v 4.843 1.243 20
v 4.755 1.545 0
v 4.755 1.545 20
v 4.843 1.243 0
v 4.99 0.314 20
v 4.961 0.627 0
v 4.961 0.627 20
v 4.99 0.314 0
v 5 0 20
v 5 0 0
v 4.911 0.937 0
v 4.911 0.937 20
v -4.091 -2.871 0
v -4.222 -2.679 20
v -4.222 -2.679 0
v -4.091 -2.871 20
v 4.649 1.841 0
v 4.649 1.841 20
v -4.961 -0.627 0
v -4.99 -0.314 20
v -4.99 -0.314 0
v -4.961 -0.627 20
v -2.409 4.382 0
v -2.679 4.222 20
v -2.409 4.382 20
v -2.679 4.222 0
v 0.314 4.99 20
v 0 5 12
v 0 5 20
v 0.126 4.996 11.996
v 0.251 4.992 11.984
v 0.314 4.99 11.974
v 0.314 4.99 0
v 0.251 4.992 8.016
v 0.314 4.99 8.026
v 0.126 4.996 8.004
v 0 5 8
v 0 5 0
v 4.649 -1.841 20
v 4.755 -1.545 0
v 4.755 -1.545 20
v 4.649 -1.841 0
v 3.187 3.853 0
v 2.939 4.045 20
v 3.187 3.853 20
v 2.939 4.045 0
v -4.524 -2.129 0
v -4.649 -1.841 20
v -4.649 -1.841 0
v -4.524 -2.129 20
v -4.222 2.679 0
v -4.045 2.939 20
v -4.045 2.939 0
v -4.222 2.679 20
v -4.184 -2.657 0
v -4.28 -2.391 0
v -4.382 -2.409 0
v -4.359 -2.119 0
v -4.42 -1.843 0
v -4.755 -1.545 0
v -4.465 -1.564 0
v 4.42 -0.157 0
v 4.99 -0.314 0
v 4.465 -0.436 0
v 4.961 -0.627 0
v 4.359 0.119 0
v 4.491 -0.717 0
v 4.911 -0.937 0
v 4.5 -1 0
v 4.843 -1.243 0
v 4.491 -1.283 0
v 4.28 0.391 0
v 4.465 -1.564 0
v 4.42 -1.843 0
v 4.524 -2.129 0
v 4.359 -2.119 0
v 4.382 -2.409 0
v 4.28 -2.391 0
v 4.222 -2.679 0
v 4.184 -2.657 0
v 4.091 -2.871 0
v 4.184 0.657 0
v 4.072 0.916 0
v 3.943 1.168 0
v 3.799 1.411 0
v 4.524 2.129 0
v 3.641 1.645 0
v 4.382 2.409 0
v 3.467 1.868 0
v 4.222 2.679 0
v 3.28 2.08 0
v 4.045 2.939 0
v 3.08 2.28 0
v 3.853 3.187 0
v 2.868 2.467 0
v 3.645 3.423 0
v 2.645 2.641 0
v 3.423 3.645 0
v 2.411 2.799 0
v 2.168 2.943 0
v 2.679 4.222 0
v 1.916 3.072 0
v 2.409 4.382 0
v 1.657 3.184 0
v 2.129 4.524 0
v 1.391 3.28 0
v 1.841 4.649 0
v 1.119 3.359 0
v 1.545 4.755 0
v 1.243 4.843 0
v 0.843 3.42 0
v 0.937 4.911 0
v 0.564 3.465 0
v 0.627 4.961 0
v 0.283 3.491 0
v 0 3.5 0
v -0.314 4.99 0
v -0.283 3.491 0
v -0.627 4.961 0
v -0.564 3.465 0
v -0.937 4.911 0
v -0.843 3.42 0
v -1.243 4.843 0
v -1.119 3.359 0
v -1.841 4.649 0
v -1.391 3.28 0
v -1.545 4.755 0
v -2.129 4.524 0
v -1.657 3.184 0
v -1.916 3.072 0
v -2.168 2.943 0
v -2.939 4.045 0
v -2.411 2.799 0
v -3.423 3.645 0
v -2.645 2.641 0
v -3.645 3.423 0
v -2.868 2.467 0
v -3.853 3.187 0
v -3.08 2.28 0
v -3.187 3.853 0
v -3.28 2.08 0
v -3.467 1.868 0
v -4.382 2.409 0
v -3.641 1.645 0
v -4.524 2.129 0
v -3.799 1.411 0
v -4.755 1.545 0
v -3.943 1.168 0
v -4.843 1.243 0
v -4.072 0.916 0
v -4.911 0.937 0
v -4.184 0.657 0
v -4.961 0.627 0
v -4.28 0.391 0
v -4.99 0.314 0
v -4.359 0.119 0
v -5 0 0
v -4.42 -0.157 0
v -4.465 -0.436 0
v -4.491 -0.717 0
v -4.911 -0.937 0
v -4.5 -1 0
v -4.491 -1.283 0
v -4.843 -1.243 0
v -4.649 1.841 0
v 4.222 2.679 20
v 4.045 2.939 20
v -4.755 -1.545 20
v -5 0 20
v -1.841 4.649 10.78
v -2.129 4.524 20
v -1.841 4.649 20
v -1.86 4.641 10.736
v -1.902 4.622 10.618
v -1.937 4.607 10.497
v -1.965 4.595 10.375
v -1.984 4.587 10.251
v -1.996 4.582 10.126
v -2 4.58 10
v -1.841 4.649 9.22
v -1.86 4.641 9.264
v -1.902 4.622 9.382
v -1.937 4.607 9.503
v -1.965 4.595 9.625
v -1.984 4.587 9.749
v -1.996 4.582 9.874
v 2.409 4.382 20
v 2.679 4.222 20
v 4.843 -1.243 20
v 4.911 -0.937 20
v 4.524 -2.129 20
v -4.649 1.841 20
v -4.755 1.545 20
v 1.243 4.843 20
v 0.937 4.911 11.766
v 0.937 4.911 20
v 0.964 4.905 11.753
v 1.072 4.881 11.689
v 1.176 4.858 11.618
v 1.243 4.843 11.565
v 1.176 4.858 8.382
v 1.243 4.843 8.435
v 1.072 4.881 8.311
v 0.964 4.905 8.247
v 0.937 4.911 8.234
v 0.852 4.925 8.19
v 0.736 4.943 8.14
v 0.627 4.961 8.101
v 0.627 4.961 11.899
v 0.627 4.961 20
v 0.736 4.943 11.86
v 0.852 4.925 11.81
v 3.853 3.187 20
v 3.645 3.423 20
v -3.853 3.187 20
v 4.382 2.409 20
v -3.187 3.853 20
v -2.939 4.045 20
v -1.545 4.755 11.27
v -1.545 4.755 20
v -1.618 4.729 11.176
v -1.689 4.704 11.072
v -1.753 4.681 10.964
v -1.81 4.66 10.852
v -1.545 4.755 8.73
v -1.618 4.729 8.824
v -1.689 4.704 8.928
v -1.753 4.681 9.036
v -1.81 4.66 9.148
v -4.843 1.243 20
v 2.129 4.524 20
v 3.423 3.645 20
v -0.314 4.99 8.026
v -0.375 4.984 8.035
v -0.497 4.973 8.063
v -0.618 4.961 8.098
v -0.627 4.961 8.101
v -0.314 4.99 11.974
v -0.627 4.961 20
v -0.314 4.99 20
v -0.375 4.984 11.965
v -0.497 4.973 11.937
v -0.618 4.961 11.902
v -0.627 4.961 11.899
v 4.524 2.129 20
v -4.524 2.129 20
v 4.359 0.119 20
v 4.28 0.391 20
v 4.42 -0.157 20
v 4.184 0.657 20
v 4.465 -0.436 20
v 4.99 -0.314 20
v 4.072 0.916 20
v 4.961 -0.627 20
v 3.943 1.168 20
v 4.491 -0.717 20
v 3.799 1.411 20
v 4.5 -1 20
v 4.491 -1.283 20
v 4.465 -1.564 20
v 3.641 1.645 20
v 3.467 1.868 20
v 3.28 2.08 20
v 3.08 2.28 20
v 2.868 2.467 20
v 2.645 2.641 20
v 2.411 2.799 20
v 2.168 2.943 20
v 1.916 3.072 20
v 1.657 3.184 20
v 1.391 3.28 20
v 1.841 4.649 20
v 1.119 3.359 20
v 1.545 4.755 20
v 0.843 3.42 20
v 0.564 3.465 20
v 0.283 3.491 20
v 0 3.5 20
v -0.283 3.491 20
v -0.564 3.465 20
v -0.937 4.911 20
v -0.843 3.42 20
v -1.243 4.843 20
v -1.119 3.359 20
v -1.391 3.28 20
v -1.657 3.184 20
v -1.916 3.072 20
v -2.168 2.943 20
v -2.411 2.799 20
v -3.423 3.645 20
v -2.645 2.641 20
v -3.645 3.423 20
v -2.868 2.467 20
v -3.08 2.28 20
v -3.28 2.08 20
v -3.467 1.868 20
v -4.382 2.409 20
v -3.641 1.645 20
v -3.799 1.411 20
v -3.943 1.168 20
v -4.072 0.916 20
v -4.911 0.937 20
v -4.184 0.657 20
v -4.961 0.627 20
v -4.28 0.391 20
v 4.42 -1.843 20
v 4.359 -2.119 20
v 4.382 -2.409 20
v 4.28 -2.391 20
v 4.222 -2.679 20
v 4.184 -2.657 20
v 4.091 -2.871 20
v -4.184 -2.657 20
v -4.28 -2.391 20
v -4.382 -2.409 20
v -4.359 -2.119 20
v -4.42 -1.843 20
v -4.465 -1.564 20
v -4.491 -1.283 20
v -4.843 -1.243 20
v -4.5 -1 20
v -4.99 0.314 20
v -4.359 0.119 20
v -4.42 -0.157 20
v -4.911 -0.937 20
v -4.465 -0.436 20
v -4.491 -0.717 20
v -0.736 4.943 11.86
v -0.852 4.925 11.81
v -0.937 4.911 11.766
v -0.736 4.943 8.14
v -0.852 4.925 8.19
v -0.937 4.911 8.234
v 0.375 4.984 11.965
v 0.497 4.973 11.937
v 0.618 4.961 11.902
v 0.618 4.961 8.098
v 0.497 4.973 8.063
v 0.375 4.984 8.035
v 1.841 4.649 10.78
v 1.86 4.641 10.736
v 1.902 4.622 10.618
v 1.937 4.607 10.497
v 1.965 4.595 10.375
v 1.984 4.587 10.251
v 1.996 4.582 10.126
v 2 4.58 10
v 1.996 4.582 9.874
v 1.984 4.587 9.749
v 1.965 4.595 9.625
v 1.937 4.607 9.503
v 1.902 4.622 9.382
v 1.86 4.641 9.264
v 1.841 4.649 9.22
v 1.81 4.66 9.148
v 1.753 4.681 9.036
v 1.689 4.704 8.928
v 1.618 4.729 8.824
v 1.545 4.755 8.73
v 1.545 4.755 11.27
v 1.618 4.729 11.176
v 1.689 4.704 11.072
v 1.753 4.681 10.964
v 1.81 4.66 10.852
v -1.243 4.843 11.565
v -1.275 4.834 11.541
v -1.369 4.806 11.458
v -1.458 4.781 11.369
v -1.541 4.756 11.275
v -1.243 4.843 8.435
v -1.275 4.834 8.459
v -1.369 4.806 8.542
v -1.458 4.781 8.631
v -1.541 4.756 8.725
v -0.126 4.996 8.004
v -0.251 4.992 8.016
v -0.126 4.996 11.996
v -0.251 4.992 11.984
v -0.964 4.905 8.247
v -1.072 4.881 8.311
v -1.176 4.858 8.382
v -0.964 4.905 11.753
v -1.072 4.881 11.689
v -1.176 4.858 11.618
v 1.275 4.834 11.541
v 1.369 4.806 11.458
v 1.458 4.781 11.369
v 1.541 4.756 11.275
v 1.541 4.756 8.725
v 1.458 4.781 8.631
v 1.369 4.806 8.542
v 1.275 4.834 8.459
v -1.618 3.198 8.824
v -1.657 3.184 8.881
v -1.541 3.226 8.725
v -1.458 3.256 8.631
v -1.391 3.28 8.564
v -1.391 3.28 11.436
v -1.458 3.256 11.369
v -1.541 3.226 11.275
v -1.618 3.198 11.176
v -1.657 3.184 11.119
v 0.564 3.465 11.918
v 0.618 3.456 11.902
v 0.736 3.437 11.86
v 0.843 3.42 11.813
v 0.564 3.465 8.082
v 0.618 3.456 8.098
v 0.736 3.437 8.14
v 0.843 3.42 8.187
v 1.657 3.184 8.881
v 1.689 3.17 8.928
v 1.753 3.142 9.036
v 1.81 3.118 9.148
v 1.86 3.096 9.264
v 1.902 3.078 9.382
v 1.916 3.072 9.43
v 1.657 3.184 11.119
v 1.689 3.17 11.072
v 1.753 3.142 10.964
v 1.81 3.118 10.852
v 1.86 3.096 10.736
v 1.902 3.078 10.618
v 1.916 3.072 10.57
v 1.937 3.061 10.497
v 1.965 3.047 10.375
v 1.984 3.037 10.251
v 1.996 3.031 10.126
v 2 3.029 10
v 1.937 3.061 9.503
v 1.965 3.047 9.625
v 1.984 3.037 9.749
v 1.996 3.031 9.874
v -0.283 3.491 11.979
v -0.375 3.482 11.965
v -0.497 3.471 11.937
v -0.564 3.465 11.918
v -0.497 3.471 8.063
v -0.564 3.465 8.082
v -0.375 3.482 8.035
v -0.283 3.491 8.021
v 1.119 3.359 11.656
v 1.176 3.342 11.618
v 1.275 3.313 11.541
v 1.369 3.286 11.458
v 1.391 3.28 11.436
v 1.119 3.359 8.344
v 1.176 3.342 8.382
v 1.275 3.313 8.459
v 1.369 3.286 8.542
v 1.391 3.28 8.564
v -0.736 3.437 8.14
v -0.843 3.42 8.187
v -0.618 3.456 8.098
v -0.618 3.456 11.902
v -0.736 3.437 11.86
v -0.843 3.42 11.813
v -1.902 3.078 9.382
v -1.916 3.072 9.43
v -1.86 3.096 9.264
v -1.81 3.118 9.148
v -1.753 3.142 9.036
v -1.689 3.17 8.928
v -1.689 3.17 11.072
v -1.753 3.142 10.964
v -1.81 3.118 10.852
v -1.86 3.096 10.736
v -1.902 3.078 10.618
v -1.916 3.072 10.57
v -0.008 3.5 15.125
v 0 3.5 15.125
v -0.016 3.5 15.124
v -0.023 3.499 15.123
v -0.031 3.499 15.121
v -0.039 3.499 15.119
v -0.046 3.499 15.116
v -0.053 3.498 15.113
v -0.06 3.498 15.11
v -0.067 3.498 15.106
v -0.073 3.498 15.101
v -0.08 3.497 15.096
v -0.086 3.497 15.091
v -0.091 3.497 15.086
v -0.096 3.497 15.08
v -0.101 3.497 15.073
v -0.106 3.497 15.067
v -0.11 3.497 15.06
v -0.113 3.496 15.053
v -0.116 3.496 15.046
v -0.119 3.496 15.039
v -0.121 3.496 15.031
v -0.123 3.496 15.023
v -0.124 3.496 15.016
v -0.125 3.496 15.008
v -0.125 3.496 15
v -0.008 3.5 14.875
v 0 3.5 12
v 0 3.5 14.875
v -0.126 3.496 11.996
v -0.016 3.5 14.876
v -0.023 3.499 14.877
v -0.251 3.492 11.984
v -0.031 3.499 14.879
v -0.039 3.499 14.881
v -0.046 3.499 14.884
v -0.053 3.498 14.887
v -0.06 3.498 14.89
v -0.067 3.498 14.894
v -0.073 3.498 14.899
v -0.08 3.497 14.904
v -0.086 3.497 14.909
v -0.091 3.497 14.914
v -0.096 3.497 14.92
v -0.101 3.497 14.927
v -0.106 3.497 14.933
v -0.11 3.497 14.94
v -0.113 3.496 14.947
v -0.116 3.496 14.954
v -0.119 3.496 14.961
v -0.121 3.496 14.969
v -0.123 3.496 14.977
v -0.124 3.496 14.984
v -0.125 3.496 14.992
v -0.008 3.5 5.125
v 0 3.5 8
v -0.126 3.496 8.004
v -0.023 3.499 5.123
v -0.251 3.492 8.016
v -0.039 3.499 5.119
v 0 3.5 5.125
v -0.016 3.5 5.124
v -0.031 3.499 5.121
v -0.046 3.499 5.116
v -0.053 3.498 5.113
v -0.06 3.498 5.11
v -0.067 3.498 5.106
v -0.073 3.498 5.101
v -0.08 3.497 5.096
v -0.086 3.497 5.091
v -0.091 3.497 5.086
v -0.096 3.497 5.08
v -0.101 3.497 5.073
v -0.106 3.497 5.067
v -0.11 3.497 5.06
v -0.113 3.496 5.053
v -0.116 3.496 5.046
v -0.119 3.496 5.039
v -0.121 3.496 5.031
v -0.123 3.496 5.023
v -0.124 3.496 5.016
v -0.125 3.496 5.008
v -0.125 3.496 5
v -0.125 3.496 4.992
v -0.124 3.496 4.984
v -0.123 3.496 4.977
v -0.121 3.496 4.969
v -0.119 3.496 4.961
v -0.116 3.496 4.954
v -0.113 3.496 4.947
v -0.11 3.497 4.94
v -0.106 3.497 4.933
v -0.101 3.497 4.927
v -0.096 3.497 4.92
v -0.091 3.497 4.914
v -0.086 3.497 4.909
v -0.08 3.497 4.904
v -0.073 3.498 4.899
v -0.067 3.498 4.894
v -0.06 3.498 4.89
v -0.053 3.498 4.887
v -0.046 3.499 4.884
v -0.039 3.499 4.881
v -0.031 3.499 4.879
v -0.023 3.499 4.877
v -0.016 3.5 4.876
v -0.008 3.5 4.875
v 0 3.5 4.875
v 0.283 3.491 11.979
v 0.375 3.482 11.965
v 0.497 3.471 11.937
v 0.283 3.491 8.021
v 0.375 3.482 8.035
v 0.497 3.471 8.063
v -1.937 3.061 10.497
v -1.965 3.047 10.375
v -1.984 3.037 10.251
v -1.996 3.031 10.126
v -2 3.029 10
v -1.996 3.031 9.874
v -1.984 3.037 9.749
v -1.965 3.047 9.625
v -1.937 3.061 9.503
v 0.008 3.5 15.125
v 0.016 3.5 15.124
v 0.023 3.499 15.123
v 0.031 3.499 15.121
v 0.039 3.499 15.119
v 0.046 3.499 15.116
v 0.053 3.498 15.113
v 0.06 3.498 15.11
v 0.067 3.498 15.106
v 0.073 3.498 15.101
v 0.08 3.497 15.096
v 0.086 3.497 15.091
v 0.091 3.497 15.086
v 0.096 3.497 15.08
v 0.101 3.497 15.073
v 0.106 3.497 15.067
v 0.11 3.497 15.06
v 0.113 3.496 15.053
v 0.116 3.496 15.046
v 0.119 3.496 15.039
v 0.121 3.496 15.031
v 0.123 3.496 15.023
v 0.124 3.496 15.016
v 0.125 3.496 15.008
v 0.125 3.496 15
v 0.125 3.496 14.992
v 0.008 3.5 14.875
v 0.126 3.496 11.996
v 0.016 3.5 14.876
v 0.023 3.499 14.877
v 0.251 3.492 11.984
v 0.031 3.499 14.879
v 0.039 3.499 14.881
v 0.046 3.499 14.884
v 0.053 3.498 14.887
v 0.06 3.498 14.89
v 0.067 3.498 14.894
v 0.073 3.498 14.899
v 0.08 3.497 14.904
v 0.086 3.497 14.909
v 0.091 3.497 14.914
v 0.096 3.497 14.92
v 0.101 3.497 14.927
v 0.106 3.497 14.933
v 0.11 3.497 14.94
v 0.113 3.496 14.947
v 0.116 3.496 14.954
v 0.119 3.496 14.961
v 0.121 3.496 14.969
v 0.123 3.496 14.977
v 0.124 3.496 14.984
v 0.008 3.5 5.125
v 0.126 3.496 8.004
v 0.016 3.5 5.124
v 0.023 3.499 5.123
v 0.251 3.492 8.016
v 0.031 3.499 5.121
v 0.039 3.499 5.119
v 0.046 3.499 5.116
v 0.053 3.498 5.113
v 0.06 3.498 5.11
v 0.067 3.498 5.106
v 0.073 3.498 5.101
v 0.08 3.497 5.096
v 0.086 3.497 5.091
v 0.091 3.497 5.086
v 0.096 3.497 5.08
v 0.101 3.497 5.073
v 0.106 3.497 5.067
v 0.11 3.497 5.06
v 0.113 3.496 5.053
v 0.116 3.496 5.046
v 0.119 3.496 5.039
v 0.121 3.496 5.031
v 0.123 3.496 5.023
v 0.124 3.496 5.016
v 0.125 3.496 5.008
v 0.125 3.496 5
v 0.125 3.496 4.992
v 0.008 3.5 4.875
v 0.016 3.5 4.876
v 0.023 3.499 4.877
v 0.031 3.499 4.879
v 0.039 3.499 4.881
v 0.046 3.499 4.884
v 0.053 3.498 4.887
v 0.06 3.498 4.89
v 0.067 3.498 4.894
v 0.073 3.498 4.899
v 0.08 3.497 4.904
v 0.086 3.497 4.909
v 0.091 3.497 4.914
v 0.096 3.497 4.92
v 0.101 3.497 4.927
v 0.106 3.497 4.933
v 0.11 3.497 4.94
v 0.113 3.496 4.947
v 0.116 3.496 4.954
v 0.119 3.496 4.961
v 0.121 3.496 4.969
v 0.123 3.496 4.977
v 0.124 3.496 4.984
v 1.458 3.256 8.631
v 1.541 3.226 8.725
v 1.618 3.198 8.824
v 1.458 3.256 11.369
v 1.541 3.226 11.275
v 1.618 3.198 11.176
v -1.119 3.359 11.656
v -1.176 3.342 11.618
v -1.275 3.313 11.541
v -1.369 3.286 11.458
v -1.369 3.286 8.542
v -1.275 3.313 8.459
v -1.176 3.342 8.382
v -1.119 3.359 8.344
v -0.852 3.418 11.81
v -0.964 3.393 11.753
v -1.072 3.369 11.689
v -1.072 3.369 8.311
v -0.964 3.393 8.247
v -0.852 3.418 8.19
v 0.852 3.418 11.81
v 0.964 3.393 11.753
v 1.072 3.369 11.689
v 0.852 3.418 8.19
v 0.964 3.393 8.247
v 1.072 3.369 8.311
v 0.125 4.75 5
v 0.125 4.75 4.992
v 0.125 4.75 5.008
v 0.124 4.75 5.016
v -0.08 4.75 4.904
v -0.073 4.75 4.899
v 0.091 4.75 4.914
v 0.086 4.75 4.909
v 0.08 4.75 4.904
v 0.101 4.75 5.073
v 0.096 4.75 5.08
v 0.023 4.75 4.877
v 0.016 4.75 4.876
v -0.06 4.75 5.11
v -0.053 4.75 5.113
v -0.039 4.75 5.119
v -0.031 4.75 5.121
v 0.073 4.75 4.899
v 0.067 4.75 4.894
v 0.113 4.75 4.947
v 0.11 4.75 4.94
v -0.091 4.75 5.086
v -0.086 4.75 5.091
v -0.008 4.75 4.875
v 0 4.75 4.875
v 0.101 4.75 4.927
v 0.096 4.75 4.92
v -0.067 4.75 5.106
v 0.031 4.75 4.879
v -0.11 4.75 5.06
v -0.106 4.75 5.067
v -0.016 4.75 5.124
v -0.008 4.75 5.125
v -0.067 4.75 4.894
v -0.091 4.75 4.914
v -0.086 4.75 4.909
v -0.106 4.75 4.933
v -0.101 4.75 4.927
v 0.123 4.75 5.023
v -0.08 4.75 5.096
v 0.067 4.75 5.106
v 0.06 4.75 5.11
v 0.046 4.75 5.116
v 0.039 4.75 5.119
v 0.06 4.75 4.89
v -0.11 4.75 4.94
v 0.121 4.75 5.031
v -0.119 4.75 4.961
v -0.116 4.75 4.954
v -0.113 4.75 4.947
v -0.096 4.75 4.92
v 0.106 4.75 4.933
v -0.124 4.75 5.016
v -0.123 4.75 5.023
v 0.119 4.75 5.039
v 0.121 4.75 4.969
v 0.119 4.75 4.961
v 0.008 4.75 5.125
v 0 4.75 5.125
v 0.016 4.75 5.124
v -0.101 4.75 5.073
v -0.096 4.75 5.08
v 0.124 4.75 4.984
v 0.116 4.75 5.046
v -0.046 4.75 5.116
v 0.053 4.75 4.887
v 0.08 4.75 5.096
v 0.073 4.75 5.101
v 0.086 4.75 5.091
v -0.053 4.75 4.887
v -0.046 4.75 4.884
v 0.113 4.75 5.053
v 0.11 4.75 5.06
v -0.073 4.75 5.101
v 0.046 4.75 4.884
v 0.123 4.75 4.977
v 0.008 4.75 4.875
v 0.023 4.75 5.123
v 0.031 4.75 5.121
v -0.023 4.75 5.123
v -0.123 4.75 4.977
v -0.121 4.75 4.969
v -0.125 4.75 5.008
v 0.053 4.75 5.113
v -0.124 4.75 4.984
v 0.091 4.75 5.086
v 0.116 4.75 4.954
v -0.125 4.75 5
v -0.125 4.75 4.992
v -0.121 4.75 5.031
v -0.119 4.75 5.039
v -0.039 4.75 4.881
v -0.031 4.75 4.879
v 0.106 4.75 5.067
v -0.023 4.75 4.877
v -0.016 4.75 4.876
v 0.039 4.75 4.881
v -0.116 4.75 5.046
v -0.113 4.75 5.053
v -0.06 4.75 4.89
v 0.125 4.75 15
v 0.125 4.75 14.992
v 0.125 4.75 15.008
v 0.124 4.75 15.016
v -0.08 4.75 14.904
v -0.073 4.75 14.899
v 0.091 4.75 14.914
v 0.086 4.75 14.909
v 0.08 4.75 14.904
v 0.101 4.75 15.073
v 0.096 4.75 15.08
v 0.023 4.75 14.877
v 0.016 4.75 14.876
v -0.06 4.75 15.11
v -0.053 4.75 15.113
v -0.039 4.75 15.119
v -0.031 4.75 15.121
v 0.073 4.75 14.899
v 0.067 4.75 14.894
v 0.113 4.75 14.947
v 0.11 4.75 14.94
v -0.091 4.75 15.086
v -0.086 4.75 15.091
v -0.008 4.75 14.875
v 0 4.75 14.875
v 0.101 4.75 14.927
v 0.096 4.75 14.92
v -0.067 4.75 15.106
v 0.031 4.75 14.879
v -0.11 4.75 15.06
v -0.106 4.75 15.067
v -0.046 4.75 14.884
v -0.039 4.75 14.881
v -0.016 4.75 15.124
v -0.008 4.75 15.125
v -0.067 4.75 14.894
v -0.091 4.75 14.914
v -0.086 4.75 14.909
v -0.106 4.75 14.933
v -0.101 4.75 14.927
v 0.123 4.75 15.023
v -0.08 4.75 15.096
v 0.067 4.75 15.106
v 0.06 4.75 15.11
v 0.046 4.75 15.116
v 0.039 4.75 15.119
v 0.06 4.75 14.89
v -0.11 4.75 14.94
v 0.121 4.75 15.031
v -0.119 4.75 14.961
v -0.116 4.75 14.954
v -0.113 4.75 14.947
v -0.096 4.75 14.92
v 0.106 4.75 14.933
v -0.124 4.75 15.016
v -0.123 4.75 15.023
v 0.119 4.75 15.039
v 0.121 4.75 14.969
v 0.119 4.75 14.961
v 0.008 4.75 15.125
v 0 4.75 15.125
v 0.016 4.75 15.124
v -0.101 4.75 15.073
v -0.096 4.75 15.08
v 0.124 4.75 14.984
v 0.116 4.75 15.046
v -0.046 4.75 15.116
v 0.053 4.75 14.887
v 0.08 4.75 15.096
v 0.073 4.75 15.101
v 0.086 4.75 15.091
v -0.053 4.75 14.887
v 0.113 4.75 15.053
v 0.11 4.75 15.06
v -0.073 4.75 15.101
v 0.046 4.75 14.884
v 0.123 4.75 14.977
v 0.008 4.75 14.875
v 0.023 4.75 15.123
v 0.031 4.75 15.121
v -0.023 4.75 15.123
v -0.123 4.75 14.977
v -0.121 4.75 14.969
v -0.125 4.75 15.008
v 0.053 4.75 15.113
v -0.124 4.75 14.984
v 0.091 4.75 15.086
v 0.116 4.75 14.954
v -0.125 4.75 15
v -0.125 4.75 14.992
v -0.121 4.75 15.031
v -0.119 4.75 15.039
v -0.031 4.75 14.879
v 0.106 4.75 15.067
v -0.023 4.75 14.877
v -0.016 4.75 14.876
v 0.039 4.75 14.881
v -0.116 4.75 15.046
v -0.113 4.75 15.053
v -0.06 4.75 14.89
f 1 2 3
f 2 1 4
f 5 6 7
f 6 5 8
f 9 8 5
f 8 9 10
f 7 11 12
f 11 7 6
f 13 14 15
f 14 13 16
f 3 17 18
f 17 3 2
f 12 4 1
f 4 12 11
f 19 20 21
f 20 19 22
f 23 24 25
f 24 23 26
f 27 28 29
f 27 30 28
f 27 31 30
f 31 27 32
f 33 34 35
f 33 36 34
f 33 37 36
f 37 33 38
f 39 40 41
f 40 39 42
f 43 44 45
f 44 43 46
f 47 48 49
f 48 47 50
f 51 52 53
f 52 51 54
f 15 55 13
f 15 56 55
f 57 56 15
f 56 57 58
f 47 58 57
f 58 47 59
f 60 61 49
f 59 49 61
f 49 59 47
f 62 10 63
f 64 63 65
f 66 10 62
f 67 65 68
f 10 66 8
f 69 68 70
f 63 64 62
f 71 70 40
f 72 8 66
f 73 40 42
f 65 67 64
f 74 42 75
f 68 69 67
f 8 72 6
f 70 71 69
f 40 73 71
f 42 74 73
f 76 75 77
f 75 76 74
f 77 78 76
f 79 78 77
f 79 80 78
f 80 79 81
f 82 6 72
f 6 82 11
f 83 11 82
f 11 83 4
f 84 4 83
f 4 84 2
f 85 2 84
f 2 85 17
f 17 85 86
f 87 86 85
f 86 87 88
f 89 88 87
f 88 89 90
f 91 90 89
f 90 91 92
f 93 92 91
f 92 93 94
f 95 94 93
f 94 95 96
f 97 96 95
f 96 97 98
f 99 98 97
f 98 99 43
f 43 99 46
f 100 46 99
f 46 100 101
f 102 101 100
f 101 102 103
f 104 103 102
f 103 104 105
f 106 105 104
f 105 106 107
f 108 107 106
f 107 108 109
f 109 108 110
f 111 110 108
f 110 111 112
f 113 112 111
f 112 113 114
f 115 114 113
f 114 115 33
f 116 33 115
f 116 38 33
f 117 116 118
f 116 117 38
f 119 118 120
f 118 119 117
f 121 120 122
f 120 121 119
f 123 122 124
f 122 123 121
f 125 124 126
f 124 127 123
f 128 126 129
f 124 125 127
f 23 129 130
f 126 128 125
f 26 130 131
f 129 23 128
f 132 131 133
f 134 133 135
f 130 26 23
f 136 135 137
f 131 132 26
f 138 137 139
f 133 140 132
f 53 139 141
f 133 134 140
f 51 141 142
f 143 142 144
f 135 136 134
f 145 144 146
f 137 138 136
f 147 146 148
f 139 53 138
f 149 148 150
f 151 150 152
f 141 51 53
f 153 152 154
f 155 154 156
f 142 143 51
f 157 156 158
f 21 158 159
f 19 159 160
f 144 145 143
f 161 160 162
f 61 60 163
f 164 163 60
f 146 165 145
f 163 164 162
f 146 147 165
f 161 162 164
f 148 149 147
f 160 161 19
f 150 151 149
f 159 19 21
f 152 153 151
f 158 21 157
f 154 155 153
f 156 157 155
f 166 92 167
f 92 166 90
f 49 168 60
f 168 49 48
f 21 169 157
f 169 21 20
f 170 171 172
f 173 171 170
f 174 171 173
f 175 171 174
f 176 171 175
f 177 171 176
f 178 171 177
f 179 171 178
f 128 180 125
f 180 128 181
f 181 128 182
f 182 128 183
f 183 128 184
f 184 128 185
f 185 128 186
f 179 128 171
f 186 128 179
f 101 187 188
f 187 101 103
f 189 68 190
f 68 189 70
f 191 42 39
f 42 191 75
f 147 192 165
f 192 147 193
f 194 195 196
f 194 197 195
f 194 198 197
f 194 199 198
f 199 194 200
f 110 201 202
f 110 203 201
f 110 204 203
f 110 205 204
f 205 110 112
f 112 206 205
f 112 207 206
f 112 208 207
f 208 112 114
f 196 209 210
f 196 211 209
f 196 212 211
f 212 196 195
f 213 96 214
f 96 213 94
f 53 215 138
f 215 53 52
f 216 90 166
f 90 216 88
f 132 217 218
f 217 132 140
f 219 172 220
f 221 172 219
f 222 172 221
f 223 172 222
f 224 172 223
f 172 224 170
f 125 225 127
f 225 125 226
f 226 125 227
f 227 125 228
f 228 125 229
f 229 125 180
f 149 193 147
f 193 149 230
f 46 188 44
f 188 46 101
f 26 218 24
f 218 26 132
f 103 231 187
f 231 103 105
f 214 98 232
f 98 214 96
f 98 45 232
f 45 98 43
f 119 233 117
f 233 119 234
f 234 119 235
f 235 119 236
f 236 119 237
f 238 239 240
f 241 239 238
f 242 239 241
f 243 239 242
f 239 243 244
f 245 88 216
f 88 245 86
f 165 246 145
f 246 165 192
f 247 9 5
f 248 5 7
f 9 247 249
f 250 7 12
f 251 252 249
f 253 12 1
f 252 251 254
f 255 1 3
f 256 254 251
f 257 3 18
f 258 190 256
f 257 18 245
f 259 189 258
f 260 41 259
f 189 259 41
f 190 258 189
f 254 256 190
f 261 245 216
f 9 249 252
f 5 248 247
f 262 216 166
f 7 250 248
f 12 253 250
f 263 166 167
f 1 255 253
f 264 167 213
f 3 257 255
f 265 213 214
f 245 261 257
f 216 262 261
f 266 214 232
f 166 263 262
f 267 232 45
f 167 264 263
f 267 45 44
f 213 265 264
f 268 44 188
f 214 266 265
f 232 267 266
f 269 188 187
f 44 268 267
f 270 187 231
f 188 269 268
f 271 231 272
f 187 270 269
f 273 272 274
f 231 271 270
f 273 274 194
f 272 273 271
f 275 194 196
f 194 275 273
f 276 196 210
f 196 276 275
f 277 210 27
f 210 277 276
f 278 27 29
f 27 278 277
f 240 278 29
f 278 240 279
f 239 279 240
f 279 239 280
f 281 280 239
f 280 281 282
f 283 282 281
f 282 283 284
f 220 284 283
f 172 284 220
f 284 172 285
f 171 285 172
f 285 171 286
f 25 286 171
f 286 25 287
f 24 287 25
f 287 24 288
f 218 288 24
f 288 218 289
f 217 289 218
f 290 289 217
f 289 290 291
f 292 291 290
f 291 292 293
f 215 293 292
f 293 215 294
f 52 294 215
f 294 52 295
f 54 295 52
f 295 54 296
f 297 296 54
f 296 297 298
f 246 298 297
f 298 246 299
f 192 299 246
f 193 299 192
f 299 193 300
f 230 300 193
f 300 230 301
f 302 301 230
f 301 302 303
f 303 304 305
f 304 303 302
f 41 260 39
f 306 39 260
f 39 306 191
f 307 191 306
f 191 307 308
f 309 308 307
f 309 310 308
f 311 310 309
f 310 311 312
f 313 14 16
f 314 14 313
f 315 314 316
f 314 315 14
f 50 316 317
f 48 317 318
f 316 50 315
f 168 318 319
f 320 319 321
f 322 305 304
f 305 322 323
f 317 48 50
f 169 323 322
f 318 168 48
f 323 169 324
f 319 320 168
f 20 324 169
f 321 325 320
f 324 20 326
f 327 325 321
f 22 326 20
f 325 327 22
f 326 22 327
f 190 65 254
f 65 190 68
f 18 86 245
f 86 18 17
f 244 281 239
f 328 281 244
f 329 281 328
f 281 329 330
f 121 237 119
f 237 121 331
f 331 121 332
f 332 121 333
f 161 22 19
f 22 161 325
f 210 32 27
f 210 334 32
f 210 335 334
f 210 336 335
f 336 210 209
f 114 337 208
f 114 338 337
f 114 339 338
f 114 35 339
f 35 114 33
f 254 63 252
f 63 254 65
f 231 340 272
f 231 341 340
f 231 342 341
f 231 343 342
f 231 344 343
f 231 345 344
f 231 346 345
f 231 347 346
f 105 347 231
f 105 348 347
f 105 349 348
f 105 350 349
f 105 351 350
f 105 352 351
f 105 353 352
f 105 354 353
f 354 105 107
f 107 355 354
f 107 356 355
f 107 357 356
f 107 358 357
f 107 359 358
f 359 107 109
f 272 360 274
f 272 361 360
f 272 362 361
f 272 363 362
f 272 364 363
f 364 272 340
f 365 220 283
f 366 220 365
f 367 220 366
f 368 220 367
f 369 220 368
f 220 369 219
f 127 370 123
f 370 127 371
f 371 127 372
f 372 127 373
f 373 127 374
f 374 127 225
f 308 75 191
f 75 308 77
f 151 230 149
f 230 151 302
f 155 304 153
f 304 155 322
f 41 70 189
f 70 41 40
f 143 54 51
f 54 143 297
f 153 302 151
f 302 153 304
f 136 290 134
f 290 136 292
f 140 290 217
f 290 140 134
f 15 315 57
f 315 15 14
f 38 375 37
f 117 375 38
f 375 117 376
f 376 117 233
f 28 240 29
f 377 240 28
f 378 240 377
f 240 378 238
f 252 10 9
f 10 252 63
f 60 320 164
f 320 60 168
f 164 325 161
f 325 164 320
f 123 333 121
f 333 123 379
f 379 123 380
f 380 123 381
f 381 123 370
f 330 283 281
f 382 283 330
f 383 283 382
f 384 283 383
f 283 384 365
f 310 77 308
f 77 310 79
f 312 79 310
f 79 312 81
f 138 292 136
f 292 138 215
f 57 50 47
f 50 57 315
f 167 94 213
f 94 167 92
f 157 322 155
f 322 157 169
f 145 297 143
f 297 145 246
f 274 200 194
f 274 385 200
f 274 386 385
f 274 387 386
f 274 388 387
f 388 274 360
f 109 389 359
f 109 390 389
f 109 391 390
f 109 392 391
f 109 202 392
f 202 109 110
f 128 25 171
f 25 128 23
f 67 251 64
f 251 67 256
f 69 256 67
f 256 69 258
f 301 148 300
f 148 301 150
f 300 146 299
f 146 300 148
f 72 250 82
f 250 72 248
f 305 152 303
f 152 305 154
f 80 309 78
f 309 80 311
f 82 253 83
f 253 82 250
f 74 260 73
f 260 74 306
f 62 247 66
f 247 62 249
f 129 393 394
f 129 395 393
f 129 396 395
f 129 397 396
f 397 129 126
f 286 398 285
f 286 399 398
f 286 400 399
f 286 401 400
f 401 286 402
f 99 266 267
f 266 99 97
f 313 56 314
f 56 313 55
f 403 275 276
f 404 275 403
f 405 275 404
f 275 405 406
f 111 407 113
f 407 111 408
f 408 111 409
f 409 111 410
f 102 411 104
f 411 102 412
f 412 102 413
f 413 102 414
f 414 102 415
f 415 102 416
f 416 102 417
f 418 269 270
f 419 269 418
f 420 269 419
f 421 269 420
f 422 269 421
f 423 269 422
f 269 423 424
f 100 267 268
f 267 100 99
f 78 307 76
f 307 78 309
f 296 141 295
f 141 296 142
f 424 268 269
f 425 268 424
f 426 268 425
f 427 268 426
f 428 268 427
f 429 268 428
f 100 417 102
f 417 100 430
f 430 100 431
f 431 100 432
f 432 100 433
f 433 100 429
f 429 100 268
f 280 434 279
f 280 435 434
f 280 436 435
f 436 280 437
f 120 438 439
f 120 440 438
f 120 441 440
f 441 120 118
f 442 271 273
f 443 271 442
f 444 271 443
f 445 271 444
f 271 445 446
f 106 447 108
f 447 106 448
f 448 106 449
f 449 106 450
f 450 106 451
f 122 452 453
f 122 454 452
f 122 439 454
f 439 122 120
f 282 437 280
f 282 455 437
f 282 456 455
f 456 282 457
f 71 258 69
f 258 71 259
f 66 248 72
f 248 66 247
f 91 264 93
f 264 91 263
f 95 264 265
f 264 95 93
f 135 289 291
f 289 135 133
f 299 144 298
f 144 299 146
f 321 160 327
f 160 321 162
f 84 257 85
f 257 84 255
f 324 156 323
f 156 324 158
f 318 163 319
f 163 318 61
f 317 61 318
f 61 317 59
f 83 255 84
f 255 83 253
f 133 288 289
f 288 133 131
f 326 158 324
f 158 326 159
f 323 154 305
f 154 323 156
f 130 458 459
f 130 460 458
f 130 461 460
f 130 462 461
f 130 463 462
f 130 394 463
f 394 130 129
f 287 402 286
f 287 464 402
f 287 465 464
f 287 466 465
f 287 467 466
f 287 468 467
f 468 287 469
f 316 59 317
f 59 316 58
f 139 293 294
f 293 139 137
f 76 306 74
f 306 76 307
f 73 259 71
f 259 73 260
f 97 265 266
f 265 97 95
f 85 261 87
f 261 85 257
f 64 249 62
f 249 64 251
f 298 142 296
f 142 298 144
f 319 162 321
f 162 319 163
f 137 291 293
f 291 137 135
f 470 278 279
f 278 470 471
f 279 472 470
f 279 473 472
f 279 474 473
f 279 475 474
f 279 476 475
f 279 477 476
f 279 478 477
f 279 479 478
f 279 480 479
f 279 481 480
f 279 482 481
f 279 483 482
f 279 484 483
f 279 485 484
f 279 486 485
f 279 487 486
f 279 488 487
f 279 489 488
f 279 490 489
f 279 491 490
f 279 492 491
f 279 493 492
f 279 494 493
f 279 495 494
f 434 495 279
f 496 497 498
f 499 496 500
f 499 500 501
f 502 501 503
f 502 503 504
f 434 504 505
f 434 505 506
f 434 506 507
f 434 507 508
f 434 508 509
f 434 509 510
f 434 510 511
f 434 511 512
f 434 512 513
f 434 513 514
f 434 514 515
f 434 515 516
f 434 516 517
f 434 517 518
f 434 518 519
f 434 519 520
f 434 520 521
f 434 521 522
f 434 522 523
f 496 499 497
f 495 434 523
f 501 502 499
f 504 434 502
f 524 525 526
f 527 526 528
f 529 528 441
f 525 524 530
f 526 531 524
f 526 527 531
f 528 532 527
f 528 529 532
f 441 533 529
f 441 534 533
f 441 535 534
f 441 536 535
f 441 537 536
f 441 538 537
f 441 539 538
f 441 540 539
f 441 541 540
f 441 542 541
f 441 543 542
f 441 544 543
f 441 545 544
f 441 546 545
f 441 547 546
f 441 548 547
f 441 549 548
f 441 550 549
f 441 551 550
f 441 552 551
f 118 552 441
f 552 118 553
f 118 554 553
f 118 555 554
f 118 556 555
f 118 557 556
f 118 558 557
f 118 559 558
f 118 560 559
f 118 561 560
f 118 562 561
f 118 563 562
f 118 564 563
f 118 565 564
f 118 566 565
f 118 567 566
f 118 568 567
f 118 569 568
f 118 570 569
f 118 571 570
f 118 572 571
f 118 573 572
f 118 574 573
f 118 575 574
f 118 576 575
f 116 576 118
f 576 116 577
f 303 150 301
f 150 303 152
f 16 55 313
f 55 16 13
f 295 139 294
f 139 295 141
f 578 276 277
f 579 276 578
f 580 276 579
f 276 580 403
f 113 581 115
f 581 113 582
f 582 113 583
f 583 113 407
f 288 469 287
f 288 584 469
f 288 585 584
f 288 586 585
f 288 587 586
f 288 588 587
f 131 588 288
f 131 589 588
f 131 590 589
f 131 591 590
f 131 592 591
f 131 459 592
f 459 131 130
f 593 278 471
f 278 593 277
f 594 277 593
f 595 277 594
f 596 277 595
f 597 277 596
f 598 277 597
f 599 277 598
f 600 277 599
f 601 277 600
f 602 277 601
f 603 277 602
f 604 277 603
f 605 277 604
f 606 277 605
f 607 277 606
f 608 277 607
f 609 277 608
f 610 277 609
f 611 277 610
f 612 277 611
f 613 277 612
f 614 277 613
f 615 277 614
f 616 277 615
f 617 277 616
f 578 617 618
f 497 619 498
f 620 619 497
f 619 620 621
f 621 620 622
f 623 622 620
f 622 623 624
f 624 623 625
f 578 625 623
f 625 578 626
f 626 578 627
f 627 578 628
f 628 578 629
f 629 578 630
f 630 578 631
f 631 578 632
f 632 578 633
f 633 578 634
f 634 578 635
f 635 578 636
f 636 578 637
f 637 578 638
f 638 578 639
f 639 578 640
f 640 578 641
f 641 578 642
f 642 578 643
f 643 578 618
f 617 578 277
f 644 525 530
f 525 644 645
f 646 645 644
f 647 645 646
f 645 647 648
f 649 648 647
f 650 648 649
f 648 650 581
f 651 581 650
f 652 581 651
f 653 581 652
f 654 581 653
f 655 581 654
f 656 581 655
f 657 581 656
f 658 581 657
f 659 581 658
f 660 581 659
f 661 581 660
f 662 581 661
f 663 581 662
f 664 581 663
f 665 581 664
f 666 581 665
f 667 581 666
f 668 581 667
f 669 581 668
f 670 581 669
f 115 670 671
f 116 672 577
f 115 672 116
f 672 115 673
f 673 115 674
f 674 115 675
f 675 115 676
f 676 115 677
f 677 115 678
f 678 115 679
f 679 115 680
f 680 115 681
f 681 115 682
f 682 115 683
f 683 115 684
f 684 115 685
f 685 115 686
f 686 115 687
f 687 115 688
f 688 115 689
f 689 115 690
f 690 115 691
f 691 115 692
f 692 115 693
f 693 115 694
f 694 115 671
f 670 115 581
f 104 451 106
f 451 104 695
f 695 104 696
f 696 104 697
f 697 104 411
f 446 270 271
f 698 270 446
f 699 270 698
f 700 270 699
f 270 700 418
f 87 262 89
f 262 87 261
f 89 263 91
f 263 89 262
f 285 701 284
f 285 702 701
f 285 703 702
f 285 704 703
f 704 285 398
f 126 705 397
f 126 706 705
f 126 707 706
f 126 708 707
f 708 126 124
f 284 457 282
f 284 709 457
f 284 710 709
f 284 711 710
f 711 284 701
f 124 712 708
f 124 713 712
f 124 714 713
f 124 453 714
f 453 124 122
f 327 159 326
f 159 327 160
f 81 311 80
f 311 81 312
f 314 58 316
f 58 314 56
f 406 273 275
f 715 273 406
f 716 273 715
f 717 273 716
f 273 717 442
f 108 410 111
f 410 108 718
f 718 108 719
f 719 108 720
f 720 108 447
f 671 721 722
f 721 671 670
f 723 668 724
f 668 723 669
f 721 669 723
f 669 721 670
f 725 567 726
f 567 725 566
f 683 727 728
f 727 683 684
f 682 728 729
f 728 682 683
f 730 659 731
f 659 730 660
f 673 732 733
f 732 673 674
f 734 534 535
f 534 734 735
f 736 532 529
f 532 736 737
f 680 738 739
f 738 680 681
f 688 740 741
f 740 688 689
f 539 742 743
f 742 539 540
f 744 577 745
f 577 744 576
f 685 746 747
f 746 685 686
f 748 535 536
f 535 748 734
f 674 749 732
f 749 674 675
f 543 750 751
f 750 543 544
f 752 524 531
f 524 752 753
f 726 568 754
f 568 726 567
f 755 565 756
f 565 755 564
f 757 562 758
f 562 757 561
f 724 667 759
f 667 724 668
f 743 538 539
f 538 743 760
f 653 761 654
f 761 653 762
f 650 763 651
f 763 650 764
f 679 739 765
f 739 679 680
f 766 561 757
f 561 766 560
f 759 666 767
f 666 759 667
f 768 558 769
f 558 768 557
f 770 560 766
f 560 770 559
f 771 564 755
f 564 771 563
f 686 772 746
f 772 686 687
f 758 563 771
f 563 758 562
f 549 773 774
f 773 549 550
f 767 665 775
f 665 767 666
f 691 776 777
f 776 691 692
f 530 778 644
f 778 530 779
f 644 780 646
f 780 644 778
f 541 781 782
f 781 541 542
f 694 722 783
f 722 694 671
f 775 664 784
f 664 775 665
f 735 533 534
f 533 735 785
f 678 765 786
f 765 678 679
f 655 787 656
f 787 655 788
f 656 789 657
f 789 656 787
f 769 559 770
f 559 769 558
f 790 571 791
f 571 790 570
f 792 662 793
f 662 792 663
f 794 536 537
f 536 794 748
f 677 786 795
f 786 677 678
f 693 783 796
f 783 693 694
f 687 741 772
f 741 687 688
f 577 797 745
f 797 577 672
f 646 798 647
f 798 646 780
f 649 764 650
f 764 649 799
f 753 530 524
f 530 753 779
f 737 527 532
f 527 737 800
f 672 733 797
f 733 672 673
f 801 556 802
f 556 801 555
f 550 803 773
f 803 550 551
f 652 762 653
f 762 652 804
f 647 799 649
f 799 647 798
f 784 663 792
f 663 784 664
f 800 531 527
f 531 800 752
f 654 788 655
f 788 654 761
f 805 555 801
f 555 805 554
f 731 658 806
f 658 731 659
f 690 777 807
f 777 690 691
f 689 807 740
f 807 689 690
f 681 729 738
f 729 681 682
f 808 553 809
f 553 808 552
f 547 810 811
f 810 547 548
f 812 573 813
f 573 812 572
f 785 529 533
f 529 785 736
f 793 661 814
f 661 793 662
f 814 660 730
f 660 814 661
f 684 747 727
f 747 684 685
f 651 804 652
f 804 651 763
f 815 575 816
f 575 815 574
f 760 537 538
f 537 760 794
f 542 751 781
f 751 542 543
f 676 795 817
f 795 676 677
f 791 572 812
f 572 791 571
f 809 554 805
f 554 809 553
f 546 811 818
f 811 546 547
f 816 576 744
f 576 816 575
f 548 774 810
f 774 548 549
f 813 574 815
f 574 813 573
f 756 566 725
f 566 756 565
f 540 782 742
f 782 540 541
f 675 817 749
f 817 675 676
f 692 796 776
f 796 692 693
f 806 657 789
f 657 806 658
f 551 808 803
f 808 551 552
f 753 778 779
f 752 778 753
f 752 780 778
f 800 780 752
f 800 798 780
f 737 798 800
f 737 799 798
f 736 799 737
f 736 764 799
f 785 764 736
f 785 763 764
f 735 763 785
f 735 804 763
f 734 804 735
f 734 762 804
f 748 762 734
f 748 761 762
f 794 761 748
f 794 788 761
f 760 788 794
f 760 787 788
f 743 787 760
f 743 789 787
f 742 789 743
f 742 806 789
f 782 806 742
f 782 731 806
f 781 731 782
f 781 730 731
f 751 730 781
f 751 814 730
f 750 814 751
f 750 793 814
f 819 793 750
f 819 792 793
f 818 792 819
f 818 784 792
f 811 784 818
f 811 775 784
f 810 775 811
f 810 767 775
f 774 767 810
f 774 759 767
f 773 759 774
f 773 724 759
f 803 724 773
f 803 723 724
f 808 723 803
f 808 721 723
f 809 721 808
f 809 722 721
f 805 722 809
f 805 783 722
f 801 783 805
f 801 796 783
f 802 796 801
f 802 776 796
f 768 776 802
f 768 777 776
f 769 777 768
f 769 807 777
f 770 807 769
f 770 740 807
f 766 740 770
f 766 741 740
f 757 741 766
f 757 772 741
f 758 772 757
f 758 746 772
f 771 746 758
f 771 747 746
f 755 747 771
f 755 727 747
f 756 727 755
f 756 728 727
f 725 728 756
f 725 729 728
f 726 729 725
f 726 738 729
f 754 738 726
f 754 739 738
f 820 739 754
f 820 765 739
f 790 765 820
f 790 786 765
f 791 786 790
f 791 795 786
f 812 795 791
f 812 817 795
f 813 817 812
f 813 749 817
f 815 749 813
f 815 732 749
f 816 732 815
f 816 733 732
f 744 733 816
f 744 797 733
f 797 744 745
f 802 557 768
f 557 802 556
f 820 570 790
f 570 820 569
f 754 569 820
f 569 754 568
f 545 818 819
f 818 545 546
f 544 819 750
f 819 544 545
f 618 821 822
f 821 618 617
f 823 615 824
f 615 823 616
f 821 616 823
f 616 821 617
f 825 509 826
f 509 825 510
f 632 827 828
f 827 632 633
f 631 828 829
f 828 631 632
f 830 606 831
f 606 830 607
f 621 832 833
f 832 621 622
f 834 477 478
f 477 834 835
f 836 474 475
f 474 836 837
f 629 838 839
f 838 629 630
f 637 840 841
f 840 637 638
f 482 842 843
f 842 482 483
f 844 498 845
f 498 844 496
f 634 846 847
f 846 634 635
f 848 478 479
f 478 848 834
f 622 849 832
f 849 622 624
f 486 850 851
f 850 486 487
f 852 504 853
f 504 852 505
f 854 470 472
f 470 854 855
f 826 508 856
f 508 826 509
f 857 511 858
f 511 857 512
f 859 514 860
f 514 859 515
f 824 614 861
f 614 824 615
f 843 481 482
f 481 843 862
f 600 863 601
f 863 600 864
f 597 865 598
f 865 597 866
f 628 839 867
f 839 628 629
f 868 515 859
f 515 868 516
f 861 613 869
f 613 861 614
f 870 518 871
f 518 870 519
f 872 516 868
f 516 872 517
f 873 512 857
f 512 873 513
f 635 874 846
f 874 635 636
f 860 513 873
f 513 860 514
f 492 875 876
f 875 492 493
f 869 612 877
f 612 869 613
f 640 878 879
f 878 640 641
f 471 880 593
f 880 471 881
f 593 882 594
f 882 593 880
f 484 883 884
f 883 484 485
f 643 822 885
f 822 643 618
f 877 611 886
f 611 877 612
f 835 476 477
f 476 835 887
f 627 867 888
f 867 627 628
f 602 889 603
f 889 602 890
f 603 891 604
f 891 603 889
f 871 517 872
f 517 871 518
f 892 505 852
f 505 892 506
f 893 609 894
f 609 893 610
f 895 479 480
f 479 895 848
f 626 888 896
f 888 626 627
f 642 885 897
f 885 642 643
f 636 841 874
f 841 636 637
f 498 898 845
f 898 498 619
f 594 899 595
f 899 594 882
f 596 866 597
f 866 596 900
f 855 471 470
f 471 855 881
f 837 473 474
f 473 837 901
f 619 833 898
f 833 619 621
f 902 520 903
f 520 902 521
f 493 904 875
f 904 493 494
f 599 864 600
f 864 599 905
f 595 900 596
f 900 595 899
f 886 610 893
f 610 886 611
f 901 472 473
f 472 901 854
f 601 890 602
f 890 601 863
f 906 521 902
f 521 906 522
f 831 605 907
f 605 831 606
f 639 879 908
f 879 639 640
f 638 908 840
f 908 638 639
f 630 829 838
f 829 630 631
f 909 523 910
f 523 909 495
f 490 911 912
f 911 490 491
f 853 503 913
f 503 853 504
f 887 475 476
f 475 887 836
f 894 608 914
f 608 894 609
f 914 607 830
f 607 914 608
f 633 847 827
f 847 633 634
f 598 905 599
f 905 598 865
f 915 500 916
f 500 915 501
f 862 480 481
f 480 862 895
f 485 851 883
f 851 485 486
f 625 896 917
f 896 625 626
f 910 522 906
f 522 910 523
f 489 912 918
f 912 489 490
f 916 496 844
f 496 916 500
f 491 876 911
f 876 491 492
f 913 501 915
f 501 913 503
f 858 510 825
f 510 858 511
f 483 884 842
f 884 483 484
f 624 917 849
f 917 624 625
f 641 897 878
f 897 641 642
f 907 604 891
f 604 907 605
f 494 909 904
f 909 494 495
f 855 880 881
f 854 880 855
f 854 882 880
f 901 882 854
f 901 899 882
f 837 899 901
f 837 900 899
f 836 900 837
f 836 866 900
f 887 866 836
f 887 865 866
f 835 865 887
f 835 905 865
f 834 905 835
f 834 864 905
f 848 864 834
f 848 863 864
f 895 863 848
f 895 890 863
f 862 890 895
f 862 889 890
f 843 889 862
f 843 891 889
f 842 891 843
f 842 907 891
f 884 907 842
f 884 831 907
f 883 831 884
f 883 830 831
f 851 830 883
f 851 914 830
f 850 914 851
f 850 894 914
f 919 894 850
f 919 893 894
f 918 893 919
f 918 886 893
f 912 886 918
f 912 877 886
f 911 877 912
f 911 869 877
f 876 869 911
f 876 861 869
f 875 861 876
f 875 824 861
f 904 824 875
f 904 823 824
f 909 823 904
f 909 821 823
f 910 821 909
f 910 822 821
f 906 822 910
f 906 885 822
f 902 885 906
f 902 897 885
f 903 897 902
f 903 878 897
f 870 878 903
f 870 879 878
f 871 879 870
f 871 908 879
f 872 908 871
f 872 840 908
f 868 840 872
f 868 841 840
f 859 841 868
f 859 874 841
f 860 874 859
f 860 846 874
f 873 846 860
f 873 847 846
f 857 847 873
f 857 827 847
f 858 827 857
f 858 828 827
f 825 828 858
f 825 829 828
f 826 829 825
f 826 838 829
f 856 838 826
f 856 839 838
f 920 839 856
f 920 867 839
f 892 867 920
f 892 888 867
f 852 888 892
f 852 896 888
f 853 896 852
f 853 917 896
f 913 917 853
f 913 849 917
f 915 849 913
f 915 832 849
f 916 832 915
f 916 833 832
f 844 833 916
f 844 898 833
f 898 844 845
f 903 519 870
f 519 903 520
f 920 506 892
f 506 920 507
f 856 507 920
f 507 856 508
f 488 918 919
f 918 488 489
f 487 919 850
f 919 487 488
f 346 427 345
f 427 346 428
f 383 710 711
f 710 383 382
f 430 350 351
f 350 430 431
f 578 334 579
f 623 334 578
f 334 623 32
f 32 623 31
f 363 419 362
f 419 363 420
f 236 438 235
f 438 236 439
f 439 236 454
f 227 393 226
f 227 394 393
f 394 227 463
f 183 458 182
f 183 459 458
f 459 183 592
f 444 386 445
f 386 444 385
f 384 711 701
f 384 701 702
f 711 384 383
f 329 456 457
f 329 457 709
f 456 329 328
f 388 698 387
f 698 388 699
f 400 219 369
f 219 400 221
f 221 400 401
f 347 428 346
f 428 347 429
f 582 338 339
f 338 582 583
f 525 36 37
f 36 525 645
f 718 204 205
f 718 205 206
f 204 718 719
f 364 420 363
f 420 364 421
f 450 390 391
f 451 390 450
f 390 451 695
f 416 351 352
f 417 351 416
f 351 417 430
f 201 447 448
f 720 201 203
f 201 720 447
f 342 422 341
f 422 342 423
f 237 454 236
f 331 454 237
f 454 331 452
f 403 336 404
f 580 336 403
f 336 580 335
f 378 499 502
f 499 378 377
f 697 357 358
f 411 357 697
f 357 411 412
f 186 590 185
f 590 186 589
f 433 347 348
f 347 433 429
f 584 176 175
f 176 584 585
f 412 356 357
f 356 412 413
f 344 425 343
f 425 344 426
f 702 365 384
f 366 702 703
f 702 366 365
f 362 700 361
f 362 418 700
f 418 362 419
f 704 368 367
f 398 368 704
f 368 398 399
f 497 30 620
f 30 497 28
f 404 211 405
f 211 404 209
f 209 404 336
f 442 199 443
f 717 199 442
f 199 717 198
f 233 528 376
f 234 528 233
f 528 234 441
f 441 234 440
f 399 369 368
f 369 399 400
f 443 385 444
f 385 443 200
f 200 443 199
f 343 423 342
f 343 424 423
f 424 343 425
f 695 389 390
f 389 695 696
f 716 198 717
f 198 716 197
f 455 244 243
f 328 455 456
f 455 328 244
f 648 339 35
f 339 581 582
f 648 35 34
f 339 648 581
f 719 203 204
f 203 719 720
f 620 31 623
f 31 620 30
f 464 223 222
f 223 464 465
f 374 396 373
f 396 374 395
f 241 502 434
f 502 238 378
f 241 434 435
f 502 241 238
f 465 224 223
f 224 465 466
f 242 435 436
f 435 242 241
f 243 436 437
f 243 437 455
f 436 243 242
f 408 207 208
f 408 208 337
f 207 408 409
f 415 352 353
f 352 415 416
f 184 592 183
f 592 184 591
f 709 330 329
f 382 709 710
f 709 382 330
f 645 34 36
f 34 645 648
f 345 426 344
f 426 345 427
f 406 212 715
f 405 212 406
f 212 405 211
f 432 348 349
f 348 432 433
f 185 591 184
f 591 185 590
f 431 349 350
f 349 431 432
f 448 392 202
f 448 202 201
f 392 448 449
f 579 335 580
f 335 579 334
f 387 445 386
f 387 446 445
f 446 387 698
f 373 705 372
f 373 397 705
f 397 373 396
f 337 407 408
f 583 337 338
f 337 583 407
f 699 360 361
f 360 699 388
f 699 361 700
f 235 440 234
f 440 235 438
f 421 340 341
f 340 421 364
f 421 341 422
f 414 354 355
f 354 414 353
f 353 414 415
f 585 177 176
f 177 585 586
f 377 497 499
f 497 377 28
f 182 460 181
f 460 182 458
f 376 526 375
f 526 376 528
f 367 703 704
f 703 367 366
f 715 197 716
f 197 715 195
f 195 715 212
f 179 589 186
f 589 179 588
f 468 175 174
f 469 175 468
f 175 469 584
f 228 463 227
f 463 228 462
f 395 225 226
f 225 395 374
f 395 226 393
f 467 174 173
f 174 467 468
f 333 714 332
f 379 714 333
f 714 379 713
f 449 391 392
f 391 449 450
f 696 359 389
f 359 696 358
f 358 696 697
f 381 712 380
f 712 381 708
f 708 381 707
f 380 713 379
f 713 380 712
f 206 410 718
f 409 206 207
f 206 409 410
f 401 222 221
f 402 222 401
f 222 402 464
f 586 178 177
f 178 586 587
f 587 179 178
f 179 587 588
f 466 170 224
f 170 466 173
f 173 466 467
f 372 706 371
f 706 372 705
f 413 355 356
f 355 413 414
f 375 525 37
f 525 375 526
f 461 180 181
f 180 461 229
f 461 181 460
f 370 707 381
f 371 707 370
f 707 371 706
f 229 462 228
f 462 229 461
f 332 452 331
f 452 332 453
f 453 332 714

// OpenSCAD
inch = 25.4;
$fn = 100;

blade_r = 25.5 / 2;
hilt_r = 30.5 / 2;

cutout_width = 6;
cutout_height = 16;
cutout_depth = 2.5;


screw_shaft = 2;
shaft_length = (2 * inch);
screw_head = 4.5;
head_length = 5;

module screw_hole() {
    union() {
        cylinder(h = head_length, r1 = screw_shaft, r2 = screw_head);
        
        translate([0, 0, -shaft_length]) {
            cylinder(h = shaft_length, r = screw_shaft);
        }
    }    
}


difference() {
    difference() {
        union() {
            difference() {
                cylinder(h = 20, r = 5);
                translate([0, -1, 0]) {
                    cylinder(h = 20, r = 4.5);
                }
            }
        }

        translate([0, 4.75, 5]) {
            rotate([90, 0, 0]) {
                cylinder(h = 5, r = .125);
            }
        }
        
        translate([0, 4.75, 15]) {
            rotate([90, 0, 0]) {
                cylinder(h = 5, r = .125);
            }
        }
        
        translate([0, 10, 0]) {
            screw_hole();
        }
    }

    translate([0, 0, 10]) {
        rotate([90, 0, 0]) {
            screw_hole();
        }
    }
}
